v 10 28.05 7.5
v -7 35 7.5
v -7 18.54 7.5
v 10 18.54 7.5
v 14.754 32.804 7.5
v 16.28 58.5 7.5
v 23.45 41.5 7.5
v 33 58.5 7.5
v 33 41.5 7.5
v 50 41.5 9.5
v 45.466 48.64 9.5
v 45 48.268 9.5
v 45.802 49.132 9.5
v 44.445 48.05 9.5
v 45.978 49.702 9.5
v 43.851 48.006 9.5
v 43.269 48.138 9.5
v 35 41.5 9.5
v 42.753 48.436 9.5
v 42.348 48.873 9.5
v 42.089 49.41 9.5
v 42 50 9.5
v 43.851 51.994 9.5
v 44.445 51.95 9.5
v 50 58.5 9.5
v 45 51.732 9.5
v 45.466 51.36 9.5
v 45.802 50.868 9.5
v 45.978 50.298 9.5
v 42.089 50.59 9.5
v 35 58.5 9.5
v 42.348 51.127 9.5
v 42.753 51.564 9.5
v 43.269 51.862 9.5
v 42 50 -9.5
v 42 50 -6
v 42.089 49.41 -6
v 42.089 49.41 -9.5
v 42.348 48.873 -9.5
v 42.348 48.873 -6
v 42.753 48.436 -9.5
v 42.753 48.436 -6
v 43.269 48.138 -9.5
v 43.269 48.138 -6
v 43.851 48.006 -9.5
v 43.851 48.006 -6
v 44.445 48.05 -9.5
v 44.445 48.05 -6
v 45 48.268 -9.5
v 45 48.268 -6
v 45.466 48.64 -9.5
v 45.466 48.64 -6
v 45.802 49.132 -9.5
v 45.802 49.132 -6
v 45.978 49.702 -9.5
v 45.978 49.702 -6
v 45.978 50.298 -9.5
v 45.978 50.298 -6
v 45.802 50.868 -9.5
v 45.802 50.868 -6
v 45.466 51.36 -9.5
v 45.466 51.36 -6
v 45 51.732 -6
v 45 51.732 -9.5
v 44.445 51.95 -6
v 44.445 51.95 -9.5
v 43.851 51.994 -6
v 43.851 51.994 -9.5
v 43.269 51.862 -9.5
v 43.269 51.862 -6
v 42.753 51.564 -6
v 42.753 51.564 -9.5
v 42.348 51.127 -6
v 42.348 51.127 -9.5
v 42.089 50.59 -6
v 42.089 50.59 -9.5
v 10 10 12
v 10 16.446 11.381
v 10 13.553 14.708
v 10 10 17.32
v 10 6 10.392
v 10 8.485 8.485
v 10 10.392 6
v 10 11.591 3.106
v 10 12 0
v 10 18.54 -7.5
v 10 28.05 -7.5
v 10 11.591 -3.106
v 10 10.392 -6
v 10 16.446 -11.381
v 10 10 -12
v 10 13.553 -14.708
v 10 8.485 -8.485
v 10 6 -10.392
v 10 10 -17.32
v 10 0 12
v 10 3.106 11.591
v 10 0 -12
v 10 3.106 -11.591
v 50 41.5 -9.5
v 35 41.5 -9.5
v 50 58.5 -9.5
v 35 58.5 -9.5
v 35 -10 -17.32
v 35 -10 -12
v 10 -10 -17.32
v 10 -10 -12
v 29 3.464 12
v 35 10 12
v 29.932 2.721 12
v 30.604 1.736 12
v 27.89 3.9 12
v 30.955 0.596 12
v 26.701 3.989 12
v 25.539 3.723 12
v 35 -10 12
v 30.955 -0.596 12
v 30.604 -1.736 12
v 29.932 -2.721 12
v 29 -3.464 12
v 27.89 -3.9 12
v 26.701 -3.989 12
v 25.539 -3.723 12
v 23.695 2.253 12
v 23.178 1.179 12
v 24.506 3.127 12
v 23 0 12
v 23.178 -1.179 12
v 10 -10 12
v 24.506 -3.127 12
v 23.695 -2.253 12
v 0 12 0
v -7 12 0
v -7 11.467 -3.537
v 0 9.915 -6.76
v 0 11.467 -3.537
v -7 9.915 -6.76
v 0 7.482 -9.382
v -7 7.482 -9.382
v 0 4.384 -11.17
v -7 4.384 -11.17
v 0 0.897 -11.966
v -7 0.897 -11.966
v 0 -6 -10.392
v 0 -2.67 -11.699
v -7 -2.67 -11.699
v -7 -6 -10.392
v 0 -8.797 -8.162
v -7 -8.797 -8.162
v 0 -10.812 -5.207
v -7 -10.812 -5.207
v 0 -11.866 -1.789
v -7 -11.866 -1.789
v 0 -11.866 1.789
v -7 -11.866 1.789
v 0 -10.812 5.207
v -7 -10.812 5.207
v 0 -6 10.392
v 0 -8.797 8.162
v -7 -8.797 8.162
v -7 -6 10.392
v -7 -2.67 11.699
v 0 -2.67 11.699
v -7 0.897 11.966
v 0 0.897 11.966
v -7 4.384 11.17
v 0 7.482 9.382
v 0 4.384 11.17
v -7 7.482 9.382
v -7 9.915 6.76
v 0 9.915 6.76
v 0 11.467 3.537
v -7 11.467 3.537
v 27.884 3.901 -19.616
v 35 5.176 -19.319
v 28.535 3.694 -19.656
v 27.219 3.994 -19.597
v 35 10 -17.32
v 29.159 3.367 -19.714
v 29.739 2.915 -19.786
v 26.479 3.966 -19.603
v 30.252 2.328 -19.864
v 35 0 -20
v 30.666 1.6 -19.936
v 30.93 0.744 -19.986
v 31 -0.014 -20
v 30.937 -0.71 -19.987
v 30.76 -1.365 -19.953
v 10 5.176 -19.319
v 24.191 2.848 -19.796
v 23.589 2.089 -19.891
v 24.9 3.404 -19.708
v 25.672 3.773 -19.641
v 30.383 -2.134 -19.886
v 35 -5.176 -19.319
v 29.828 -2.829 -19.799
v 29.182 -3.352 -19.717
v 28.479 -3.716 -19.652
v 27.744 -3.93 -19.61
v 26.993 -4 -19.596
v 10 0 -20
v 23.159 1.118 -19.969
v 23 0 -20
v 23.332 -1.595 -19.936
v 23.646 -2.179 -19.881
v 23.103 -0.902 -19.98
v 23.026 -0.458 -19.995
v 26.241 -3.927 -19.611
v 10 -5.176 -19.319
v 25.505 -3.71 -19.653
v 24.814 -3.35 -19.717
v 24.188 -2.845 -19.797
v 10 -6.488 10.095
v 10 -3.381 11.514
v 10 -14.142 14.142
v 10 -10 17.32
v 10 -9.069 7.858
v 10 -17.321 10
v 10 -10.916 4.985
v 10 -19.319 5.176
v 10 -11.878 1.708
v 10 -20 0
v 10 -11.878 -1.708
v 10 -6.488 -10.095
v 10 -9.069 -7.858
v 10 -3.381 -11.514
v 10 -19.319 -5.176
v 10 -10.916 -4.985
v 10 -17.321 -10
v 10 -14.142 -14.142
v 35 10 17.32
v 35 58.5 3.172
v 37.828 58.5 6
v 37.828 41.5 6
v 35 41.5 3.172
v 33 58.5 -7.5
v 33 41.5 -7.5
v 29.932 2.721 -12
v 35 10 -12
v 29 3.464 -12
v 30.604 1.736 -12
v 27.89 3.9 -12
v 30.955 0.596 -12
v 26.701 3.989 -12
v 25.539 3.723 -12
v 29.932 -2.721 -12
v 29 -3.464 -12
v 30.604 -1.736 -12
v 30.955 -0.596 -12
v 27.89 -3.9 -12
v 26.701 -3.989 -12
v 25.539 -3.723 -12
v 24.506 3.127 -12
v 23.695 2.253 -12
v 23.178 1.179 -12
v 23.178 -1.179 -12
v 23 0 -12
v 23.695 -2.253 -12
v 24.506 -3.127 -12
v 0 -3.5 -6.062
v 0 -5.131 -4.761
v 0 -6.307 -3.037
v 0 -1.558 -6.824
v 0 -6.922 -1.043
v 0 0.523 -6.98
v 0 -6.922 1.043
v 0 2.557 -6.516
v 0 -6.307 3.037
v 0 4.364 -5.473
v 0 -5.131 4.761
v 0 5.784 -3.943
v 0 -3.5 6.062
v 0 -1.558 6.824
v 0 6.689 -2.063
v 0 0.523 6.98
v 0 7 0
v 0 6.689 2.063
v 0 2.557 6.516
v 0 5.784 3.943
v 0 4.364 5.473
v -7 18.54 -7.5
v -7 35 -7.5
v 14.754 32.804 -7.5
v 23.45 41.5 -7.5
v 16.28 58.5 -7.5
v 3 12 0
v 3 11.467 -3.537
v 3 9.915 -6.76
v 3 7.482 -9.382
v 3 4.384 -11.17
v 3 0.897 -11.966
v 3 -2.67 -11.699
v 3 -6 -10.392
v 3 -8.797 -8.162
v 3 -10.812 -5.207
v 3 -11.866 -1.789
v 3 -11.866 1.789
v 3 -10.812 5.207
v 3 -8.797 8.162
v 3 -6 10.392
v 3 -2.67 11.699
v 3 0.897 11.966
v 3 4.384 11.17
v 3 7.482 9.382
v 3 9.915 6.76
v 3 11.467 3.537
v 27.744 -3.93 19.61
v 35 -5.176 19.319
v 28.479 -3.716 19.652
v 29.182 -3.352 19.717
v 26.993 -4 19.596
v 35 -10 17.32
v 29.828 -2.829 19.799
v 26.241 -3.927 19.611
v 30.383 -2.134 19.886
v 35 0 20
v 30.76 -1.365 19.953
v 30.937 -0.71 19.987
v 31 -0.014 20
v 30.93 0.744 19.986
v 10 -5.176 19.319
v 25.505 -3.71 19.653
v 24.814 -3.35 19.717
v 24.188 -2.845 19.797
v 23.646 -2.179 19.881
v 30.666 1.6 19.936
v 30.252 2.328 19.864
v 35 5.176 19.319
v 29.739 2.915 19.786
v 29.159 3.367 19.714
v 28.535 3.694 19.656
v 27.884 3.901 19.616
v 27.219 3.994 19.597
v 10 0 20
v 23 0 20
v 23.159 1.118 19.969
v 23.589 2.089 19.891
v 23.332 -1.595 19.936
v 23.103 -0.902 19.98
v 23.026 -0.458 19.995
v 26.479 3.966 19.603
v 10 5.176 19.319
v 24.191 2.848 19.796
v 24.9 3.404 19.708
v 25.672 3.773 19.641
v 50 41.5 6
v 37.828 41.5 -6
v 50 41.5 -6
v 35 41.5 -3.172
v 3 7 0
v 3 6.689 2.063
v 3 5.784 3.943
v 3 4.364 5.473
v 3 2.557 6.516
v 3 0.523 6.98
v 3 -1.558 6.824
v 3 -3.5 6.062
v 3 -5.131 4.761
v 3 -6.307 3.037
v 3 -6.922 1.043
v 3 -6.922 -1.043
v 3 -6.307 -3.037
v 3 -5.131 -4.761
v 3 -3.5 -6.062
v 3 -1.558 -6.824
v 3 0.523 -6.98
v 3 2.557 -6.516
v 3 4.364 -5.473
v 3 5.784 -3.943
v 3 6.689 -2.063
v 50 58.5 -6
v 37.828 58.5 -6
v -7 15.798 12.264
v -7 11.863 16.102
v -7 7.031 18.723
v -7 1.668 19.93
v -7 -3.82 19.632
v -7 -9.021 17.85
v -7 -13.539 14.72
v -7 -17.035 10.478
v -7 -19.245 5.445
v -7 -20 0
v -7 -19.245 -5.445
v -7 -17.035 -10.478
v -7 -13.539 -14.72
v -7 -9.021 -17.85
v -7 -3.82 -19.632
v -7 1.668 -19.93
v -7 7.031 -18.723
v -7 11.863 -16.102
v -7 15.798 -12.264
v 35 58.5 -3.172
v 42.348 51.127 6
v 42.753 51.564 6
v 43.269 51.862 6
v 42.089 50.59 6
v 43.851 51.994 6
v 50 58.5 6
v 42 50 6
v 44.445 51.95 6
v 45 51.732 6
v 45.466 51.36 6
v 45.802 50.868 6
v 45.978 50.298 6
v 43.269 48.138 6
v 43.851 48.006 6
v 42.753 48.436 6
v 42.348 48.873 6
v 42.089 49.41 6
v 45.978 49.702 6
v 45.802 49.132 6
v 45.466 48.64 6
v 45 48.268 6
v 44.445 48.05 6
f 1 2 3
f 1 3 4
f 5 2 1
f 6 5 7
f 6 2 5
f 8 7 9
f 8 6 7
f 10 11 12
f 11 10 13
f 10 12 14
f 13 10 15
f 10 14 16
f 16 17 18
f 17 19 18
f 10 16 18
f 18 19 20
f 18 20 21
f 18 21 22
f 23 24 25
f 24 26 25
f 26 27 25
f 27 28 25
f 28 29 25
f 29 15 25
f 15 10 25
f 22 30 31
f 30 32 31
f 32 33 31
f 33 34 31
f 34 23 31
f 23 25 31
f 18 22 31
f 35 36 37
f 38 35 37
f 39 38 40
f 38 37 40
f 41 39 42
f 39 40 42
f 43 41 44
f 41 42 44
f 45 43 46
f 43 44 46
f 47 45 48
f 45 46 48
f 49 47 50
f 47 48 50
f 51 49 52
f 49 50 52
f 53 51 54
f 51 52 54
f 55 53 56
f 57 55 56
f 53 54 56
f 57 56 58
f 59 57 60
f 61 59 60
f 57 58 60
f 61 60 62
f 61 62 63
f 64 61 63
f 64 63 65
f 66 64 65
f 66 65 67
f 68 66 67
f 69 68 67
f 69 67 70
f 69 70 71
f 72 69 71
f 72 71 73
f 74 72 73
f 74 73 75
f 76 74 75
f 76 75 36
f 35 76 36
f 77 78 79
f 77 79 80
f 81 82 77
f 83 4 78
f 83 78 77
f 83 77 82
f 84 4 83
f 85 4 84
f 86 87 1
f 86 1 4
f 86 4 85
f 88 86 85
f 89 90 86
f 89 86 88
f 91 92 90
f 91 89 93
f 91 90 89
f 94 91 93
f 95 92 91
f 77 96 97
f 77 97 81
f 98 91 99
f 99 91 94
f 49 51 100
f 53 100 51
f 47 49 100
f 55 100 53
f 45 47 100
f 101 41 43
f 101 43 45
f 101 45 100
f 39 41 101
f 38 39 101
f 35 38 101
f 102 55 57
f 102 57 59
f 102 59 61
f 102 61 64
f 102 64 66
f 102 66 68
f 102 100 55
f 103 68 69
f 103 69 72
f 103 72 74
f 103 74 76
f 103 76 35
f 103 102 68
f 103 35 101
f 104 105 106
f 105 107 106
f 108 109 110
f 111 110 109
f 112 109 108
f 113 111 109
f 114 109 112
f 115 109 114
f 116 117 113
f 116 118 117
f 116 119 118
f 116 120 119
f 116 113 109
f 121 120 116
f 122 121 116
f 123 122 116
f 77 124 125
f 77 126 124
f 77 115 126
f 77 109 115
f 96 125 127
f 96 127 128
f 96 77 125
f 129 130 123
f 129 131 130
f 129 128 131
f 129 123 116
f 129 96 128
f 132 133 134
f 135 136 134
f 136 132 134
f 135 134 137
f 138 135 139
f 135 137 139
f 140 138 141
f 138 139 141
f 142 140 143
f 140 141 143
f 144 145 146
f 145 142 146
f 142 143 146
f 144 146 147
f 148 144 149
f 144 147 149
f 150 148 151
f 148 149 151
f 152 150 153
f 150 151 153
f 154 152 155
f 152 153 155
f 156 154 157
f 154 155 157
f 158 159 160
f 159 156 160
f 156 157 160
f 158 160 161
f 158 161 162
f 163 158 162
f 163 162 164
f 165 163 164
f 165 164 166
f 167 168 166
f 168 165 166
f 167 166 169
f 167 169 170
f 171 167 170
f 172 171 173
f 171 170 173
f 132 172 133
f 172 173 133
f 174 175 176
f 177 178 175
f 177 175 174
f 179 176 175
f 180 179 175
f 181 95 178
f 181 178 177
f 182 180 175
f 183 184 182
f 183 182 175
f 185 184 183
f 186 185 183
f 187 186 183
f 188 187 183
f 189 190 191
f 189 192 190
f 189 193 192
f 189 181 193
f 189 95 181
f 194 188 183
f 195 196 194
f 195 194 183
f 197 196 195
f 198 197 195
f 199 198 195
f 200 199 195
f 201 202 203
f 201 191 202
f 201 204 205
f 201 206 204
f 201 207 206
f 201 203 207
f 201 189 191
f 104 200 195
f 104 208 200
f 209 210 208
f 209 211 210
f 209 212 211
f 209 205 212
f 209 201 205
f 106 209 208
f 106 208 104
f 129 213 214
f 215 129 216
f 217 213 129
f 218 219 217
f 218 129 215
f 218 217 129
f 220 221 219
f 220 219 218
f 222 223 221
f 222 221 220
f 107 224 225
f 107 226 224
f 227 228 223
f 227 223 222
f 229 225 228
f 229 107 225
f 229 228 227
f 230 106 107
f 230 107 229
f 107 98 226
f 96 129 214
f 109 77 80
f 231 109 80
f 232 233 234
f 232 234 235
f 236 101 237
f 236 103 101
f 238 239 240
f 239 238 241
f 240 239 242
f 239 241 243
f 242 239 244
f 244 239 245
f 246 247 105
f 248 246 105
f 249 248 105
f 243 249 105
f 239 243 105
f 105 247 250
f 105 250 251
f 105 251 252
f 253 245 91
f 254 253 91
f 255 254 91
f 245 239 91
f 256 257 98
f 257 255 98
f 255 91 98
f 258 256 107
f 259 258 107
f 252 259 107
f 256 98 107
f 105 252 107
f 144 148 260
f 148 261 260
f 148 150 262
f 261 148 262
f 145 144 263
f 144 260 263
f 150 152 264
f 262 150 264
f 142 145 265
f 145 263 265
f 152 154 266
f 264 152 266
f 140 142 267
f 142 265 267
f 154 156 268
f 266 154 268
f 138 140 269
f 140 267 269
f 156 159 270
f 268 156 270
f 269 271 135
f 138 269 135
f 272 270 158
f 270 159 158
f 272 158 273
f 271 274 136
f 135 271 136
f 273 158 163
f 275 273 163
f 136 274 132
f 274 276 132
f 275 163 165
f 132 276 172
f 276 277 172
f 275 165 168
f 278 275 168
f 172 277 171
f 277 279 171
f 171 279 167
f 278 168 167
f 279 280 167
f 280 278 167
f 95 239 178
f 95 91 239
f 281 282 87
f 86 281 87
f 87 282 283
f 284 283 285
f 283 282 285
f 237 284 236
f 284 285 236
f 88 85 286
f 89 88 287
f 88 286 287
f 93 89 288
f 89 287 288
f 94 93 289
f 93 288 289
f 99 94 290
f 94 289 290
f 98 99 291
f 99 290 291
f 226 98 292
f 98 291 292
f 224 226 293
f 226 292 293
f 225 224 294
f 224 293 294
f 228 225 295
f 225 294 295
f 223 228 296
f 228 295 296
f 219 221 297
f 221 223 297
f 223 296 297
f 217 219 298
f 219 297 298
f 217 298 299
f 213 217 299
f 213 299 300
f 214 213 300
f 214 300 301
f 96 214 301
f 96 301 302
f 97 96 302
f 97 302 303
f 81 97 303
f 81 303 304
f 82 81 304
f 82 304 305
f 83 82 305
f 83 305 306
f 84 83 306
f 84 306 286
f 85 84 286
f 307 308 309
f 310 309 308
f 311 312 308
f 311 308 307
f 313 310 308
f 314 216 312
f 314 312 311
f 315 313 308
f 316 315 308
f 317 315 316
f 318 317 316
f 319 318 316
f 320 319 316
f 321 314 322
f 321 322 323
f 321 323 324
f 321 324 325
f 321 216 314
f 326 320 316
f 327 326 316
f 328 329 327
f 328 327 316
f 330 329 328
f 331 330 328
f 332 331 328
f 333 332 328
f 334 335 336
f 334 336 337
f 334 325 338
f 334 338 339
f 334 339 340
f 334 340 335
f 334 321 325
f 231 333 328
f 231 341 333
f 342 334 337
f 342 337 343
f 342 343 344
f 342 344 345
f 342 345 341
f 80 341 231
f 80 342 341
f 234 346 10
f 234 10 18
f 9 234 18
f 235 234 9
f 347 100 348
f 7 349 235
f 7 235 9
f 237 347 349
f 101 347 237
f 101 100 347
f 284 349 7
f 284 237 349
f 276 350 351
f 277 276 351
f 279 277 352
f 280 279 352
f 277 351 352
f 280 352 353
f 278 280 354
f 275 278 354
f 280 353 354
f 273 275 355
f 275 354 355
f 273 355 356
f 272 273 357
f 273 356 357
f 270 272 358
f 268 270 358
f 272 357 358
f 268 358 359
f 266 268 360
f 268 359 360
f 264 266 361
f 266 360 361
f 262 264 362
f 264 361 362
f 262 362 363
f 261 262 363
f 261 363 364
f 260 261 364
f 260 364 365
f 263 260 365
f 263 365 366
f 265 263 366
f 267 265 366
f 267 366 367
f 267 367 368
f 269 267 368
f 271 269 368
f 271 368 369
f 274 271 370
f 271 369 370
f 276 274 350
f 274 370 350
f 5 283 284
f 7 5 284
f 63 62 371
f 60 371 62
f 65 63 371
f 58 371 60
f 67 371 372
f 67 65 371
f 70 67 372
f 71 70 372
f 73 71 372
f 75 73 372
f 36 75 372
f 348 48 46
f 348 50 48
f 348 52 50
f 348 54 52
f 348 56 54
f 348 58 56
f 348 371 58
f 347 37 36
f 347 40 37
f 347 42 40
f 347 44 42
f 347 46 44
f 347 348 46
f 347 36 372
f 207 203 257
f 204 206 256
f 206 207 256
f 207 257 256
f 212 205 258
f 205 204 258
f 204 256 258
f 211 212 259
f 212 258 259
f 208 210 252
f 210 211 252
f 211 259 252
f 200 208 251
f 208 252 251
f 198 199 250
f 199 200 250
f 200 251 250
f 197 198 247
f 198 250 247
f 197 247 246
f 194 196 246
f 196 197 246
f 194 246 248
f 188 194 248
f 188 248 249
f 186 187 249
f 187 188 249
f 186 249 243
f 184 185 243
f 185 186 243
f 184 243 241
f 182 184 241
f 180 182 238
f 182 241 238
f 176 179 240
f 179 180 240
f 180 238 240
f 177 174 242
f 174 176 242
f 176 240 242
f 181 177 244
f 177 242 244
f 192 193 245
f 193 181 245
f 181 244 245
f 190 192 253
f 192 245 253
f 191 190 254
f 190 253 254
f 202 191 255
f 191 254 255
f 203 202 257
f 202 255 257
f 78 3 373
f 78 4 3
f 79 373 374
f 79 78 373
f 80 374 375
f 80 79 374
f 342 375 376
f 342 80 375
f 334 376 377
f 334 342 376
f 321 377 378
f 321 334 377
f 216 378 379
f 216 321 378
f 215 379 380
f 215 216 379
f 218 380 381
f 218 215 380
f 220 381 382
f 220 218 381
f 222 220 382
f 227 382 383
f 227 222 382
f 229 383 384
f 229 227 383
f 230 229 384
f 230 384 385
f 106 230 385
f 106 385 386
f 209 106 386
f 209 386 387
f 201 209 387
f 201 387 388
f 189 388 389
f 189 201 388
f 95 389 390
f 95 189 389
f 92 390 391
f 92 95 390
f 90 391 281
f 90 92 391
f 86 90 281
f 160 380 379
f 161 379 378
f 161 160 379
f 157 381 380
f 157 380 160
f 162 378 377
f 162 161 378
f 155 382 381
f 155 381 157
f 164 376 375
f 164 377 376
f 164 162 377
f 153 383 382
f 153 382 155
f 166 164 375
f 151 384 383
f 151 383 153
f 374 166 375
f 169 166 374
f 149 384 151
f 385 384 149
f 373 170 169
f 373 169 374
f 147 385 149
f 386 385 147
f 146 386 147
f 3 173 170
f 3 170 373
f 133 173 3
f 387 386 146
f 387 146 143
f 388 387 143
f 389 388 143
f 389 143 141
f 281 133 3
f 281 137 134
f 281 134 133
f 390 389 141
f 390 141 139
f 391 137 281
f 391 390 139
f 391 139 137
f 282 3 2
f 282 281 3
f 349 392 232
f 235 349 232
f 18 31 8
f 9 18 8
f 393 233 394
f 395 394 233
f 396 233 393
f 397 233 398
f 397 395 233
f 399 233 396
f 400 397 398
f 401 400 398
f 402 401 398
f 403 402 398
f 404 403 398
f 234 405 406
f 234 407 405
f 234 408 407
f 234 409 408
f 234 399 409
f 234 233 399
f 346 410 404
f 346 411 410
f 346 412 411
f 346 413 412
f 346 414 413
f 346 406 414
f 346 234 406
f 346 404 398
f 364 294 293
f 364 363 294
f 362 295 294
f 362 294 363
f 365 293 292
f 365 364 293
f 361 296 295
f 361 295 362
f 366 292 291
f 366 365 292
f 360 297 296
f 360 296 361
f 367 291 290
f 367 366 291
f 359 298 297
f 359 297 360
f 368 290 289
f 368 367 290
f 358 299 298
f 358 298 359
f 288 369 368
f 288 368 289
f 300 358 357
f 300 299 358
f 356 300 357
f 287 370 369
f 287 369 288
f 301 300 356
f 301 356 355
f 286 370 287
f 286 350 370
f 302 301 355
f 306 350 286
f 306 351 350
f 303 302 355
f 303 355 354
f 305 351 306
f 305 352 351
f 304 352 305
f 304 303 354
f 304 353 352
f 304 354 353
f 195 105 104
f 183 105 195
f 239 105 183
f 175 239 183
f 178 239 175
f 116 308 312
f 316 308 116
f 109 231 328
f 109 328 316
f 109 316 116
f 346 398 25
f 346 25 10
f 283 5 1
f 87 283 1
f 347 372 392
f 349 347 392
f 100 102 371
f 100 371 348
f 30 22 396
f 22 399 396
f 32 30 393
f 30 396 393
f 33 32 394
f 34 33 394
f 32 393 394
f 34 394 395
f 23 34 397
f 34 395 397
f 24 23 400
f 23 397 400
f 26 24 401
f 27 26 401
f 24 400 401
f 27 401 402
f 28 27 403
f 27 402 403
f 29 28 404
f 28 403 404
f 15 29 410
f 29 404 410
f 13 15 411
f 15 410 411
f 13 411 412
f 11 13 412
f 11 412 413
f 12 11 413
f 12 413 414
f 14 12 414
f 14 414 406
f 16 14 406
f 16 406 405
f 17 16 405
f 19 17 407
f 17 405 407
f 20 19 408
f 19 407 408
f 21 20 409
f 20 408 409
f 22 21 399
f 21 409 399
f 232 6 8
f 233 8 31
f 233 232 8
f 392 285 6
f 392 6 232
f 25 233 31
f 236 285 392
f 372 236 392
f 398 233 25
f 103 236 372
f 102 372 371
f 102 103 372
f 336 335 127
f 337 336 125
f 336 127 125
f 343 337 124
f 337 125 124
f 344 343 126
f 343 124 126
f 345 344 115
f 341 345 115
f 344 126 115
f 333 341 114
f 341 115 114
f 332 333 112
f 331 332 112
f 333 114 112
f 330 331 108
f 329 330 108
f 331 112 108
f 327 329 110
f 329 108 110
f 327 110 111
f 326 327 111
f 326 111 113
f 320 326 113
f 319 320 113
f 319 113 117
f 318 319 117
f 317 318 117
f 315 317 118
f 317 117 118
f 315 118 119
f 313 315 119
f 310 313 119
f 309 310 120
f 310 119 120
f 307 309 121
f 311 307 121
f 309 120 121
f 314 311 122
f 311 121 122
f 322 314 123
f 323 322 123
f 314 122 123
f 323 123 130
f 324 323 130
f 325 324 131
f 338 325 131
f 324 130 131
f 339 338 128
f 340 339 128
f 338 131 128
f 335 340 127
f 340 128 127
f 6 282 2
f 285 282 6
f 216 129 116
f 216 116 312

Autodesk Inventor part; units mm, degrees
ref_plane "YZ Plane" through (0, 0, 0) normal (1, 0, 0) x (0, 1, 0)
sketch "Sketch1" plane through (0, 0, 0) normal (0, 0, 1) x (1, 0, 0)
  line L0 (0, 7) -> (3, 7)
  line L1 (3, 7) -> (0, 7)
  line L2 (0, 7) -> (0, 12)
  line L3 (0, 12) -> (-7, 12)
  line L4 (-7, 12) -> (-7, 20)
  line L5 (-7, 20) -> (10, 20)
  line L6 (10, 20) -> (10, 12)
  line L7 (10, 12) -> (3, 12)
  line L8 (3, 12) -> (3, 7)
  line L9 (-10.4, 0) -> (13.4, 0) projected
  point P0 (0, 0)
  dimension "d0" = 3
  dimension "d1" = 5
  dimension "d2" = 7
  dimension "d3" = 8
  dimension "d4" = 17
  dimension "d5" = 8
  dimension "d6" = 7
revolve "Revolution1" add sketch "Sketch1" angle 360 about axis through (-10, 0, 0) along (1, 0, 0)
ref_plane "Work Plane1" through (0, 0, 14) normal (0, 0, 1) x (1, 0, 0)
ref_plane "Work Plane2" through (0, 0, -14) normal (0, 0, 1) x (1, 0, 0)
sketch "Sketch46" plane through (0, 0, 14) normal (0, 0, 1) x (1, 0, 0)
  point P0 (0, 0)
sketch "Sketch47" plane through (0, 0, 0) normal (0, 0, 1) x (1, 0, 0)
  line L0 (0, 0) -> (51.7638, 0) construction
  line L1 (-7, 41.5) -> (-7, 41.6234)
  line L2 (-7, 20) -> (10, 20)
  line L3 (-7, 20) -> (10, 20) projected
  line L4 (0, 0) -> (70.7107, 0) construction
  line L5 (50, 58.5) -> (50, 41.5)
  line L6 (50, 41.5) -> (30, 41.5)
  line L7 (50, 58.5) -> (30, 58.5)
  line L8 (10, -20) -> (10, 20) projected
  line L9 (-7, -20) -> (-7, 20) projected
  line L10 (-7, 20) -> (-7, 35)
  line L11 (-7, 35) -> (16.2804, 58.5)
  line L12 (16.2804, 58.5) -> (30, 58.5)
  line L13 (14.7544, 32.8045) -> (10, 28.0502)
  line L14 (10, 28.0502) -> (10, 20)
  line L15 (-7, 20) -> (10, 20) projected
  line L16 (14.7544, 32.8045) -> (23.4498, 41.5)
  line L17 (23.4498, 41.5) -> (30, 41.5)
  line L18 (0, 0) -> (10, 10)
extrude "Extrusion42" add sketch "Sketch47" along normal mid plane 15
sketch "Sketch54" plane through (10, 0, 0) normal (1, 0, 0) x (0, 0, -1)
  arc A0 (7.5, 18.5405) -> (-7.5, 18.5405) centre (0, 0) ccw
  line L0 (-7.5, 20) -> (0, 20) projected
  line L1 (7.5, 20) -> (-7.5, 20)
  line L2 (-7.5, 20) -> (-7.5, 18.5405)
  line L3 (7.5, 20) -> (7.5, 18.5405)
  circle A1 centre (0, 0) radius 20 projected
extrude "Extrusion48" add sketch "Sketch54" against normal up to surface (17 mm away) contours A0 L1 L3 | A0 L2 L0
sketch "Sketch55" plane through (10, 18.5405, 7.5) normal (1, 0, 0) x (0, 0, -1)
  line L0 (19.5, -8.5405) -> (19.5, -28.5405)
  line L1 (19.5, -8.5405) -> (24.8205, -8.5405)
  line L2 (19.5, -28.5405) -> (24.8205, -28.5405)
  arc A0 (0, 0) -> (15, 0) centre (7.5, -18.5405) ccw projected
  line L3 (-4.5, -8.5405) -> (-4.5, -28.5405)
  line L4 (-4.5, -8.5405) -> (-9.8205, -8.5405)
  line L5 (-4.5, -28.5405) -> (-9.8205, -28.5405)
  arc A1 (24.8205, -28.5405) -> (24.8205, -8.5405) centre (7.5, -18.5405) ccw
  arc A2 (-9.8205, -8.5405) -> (-9.8205, -28.5405) centre (7.5, -18.5405) ccw
  point P0 (19.5, -18.5405)
extrude "Extrusion49" add sketch "Sketch55" along normal blind 25
sketch "Sketch56" plane through (10, -10, 12) normal (0, 0, -1) x (-1, 0, 0)
  circle A0 centre (-17, 10) radius 4
  line L0 (-25, 0) -> (-25, 20) projected
  point P0 (10, 10)
  point P1 (-25, 10)
  dimension "d298" = 8
  dimension "d299" = 8
extrude "Extrusion50" cut sketch "Sketch56" along normal through all both and the other way through all
sketch "Sketch57" plane through (23.4498, 41.5, 7.5) normal (0, -1, 0) x (1, 0, 0)
  line L0 (26.5502, -15) -> (26.5502, 0) projected
  line L1 (26.5502, -13.5) -> (11.5502, -13.5)
  line L2 (11.5502, -13.5) -> (11.5502, -1.5)
  line L3 (11.5502, -1.5) -> (26.5502, -1.5)
  line L4 (26.5502, -1.5) -> (26.5502, -13.5)
  point P0 (-23.4498, -7.5)
  point P1 (26.5502, -7.5)
  point P2 (11.5502, -7.5)
  dimension "d302" = 15
  dimension "d303" = 12
  dimension "d304" = 0
extrude "Extrusion51" cut sketch "Sketch57" against normal through all
sketch "Sketch59" plane through (0, 0, -7.5) normal (0, 0, -1) x (-1, 0, 0)
  point P0 (0, 0)
sketch "Sketch60" plane through (0, 0, -7.5) normal (0, 0, -1) x (-1, 0, 0)
  point P0 (0, 0)
sketch "Sketch62" plane through (16.2804, 58.5, -7.5) normal (0, 1, 0) x (1, 0, 0)
  line L0 (18.7196, -1.5) -> (33.7196, -1.5) projected
  line L1 (0, 0) -> (33.7196, 0) projected
  line L2 (18.7196, 0) -> (33.7196, 0)
  line L3 (33.7196, 0) -> (33.7196, 2)
  line L4 (33.7196, 2) -> (18.7196, 2)
  line L5 (33.7196, -15) -> (0, -15) projected
  line L6 (18.7196, -15) -> (33.7196, -15)
  line L7 (33.7196, -15) -> (33.7196, -17)
  line L8 (33.7196, -17) -> (18.7196, -17)
  line L9 (18.7196, 2) -> (16.7196, 0)
  line L10 (33.7196, 0) -> (7.1694, 0) projected
  line L11 (18.7196, 2) -> (21.548, 2) construction
  line L12 (18.7196, 0) -> (16.7196, 0)
  line L13 (18.7196, -17) -> (16.7196, -15)
  line L14 (18.7196, -15) -> (16.7196, -15)
  point P0 (-16.2804, -7.5)
  point P1 (16.7196, 0)
  dimension "d318" = 2
  dimension "d319" = 2
  dimension "d322" = 135
extrude "Extrusion53" add sketch "Sketch62" against normal up to surface (17 mm away)
sketch "Sketch63" plane through (50, 41.5, 6) normal (0, 0, -1) x (-1, 0, 0)
  circle A0 centre (6, 8.5) radius 2
  line L0 (0, 0) -> (0, 17) projected
  point P0 (50, -41.5)
  dimension "d323" = 4
  dimension "d324" = 6
extrude "Extrusion54" cut sketch "Sketch63" along normal through all both and the other way through all
sketch "Sketch64" plane through (16.2804, 58.5, 7.5) normal (0, 1, 0) x (1, 0, 0)
  line L0 (18.7196, 1.5) -> (33.7196, 1.5) projected
  line L1 (21.548, 1.5) -> (18.7196, 4.3284)
  line L2 (21.548, 1.5) -> (25.548, 1.5) construction
  line L3 (18.7196, 1.5) -> (18.7196, 13.5) projected
  line L4 (21.548, 1.5) -> (18.7196, 1.5)
  line L5 (18.7196, 13.5) -> (33.7196, 13.5) projected
  line L6 (21.548, 13.5) -> (18.7196, 10.6716)
  line L7 (21.548, 13.5) -> (25.548, 13.5) construction
  line L8 (18.7196, 13.5) -> (18.7196, 1.5) projected
  line L9 (18.7196, 10.6716) -> (18.7196, 13.5)
  line L10 (18.7196, 13.5) -> (21.548, 13.5)
  line L11 (18.7196, 1.5) -> (18.7196, 4.3284)
  point P0 (-16.2804, 7.5)
  point P1 (18.7196, 4.3284)
  dimension "d327" = 4
  dimension "d328" = 135
  dimension "d329" = 0
  dimension "d330" = 135
  dimension "d331" = 4
  dimension "d332" = 0
extrude "Extrusion55" add sketch "Sketch64" against normal up to surface (17 mm away)
properties part number "Wheel hub left ver 2"
